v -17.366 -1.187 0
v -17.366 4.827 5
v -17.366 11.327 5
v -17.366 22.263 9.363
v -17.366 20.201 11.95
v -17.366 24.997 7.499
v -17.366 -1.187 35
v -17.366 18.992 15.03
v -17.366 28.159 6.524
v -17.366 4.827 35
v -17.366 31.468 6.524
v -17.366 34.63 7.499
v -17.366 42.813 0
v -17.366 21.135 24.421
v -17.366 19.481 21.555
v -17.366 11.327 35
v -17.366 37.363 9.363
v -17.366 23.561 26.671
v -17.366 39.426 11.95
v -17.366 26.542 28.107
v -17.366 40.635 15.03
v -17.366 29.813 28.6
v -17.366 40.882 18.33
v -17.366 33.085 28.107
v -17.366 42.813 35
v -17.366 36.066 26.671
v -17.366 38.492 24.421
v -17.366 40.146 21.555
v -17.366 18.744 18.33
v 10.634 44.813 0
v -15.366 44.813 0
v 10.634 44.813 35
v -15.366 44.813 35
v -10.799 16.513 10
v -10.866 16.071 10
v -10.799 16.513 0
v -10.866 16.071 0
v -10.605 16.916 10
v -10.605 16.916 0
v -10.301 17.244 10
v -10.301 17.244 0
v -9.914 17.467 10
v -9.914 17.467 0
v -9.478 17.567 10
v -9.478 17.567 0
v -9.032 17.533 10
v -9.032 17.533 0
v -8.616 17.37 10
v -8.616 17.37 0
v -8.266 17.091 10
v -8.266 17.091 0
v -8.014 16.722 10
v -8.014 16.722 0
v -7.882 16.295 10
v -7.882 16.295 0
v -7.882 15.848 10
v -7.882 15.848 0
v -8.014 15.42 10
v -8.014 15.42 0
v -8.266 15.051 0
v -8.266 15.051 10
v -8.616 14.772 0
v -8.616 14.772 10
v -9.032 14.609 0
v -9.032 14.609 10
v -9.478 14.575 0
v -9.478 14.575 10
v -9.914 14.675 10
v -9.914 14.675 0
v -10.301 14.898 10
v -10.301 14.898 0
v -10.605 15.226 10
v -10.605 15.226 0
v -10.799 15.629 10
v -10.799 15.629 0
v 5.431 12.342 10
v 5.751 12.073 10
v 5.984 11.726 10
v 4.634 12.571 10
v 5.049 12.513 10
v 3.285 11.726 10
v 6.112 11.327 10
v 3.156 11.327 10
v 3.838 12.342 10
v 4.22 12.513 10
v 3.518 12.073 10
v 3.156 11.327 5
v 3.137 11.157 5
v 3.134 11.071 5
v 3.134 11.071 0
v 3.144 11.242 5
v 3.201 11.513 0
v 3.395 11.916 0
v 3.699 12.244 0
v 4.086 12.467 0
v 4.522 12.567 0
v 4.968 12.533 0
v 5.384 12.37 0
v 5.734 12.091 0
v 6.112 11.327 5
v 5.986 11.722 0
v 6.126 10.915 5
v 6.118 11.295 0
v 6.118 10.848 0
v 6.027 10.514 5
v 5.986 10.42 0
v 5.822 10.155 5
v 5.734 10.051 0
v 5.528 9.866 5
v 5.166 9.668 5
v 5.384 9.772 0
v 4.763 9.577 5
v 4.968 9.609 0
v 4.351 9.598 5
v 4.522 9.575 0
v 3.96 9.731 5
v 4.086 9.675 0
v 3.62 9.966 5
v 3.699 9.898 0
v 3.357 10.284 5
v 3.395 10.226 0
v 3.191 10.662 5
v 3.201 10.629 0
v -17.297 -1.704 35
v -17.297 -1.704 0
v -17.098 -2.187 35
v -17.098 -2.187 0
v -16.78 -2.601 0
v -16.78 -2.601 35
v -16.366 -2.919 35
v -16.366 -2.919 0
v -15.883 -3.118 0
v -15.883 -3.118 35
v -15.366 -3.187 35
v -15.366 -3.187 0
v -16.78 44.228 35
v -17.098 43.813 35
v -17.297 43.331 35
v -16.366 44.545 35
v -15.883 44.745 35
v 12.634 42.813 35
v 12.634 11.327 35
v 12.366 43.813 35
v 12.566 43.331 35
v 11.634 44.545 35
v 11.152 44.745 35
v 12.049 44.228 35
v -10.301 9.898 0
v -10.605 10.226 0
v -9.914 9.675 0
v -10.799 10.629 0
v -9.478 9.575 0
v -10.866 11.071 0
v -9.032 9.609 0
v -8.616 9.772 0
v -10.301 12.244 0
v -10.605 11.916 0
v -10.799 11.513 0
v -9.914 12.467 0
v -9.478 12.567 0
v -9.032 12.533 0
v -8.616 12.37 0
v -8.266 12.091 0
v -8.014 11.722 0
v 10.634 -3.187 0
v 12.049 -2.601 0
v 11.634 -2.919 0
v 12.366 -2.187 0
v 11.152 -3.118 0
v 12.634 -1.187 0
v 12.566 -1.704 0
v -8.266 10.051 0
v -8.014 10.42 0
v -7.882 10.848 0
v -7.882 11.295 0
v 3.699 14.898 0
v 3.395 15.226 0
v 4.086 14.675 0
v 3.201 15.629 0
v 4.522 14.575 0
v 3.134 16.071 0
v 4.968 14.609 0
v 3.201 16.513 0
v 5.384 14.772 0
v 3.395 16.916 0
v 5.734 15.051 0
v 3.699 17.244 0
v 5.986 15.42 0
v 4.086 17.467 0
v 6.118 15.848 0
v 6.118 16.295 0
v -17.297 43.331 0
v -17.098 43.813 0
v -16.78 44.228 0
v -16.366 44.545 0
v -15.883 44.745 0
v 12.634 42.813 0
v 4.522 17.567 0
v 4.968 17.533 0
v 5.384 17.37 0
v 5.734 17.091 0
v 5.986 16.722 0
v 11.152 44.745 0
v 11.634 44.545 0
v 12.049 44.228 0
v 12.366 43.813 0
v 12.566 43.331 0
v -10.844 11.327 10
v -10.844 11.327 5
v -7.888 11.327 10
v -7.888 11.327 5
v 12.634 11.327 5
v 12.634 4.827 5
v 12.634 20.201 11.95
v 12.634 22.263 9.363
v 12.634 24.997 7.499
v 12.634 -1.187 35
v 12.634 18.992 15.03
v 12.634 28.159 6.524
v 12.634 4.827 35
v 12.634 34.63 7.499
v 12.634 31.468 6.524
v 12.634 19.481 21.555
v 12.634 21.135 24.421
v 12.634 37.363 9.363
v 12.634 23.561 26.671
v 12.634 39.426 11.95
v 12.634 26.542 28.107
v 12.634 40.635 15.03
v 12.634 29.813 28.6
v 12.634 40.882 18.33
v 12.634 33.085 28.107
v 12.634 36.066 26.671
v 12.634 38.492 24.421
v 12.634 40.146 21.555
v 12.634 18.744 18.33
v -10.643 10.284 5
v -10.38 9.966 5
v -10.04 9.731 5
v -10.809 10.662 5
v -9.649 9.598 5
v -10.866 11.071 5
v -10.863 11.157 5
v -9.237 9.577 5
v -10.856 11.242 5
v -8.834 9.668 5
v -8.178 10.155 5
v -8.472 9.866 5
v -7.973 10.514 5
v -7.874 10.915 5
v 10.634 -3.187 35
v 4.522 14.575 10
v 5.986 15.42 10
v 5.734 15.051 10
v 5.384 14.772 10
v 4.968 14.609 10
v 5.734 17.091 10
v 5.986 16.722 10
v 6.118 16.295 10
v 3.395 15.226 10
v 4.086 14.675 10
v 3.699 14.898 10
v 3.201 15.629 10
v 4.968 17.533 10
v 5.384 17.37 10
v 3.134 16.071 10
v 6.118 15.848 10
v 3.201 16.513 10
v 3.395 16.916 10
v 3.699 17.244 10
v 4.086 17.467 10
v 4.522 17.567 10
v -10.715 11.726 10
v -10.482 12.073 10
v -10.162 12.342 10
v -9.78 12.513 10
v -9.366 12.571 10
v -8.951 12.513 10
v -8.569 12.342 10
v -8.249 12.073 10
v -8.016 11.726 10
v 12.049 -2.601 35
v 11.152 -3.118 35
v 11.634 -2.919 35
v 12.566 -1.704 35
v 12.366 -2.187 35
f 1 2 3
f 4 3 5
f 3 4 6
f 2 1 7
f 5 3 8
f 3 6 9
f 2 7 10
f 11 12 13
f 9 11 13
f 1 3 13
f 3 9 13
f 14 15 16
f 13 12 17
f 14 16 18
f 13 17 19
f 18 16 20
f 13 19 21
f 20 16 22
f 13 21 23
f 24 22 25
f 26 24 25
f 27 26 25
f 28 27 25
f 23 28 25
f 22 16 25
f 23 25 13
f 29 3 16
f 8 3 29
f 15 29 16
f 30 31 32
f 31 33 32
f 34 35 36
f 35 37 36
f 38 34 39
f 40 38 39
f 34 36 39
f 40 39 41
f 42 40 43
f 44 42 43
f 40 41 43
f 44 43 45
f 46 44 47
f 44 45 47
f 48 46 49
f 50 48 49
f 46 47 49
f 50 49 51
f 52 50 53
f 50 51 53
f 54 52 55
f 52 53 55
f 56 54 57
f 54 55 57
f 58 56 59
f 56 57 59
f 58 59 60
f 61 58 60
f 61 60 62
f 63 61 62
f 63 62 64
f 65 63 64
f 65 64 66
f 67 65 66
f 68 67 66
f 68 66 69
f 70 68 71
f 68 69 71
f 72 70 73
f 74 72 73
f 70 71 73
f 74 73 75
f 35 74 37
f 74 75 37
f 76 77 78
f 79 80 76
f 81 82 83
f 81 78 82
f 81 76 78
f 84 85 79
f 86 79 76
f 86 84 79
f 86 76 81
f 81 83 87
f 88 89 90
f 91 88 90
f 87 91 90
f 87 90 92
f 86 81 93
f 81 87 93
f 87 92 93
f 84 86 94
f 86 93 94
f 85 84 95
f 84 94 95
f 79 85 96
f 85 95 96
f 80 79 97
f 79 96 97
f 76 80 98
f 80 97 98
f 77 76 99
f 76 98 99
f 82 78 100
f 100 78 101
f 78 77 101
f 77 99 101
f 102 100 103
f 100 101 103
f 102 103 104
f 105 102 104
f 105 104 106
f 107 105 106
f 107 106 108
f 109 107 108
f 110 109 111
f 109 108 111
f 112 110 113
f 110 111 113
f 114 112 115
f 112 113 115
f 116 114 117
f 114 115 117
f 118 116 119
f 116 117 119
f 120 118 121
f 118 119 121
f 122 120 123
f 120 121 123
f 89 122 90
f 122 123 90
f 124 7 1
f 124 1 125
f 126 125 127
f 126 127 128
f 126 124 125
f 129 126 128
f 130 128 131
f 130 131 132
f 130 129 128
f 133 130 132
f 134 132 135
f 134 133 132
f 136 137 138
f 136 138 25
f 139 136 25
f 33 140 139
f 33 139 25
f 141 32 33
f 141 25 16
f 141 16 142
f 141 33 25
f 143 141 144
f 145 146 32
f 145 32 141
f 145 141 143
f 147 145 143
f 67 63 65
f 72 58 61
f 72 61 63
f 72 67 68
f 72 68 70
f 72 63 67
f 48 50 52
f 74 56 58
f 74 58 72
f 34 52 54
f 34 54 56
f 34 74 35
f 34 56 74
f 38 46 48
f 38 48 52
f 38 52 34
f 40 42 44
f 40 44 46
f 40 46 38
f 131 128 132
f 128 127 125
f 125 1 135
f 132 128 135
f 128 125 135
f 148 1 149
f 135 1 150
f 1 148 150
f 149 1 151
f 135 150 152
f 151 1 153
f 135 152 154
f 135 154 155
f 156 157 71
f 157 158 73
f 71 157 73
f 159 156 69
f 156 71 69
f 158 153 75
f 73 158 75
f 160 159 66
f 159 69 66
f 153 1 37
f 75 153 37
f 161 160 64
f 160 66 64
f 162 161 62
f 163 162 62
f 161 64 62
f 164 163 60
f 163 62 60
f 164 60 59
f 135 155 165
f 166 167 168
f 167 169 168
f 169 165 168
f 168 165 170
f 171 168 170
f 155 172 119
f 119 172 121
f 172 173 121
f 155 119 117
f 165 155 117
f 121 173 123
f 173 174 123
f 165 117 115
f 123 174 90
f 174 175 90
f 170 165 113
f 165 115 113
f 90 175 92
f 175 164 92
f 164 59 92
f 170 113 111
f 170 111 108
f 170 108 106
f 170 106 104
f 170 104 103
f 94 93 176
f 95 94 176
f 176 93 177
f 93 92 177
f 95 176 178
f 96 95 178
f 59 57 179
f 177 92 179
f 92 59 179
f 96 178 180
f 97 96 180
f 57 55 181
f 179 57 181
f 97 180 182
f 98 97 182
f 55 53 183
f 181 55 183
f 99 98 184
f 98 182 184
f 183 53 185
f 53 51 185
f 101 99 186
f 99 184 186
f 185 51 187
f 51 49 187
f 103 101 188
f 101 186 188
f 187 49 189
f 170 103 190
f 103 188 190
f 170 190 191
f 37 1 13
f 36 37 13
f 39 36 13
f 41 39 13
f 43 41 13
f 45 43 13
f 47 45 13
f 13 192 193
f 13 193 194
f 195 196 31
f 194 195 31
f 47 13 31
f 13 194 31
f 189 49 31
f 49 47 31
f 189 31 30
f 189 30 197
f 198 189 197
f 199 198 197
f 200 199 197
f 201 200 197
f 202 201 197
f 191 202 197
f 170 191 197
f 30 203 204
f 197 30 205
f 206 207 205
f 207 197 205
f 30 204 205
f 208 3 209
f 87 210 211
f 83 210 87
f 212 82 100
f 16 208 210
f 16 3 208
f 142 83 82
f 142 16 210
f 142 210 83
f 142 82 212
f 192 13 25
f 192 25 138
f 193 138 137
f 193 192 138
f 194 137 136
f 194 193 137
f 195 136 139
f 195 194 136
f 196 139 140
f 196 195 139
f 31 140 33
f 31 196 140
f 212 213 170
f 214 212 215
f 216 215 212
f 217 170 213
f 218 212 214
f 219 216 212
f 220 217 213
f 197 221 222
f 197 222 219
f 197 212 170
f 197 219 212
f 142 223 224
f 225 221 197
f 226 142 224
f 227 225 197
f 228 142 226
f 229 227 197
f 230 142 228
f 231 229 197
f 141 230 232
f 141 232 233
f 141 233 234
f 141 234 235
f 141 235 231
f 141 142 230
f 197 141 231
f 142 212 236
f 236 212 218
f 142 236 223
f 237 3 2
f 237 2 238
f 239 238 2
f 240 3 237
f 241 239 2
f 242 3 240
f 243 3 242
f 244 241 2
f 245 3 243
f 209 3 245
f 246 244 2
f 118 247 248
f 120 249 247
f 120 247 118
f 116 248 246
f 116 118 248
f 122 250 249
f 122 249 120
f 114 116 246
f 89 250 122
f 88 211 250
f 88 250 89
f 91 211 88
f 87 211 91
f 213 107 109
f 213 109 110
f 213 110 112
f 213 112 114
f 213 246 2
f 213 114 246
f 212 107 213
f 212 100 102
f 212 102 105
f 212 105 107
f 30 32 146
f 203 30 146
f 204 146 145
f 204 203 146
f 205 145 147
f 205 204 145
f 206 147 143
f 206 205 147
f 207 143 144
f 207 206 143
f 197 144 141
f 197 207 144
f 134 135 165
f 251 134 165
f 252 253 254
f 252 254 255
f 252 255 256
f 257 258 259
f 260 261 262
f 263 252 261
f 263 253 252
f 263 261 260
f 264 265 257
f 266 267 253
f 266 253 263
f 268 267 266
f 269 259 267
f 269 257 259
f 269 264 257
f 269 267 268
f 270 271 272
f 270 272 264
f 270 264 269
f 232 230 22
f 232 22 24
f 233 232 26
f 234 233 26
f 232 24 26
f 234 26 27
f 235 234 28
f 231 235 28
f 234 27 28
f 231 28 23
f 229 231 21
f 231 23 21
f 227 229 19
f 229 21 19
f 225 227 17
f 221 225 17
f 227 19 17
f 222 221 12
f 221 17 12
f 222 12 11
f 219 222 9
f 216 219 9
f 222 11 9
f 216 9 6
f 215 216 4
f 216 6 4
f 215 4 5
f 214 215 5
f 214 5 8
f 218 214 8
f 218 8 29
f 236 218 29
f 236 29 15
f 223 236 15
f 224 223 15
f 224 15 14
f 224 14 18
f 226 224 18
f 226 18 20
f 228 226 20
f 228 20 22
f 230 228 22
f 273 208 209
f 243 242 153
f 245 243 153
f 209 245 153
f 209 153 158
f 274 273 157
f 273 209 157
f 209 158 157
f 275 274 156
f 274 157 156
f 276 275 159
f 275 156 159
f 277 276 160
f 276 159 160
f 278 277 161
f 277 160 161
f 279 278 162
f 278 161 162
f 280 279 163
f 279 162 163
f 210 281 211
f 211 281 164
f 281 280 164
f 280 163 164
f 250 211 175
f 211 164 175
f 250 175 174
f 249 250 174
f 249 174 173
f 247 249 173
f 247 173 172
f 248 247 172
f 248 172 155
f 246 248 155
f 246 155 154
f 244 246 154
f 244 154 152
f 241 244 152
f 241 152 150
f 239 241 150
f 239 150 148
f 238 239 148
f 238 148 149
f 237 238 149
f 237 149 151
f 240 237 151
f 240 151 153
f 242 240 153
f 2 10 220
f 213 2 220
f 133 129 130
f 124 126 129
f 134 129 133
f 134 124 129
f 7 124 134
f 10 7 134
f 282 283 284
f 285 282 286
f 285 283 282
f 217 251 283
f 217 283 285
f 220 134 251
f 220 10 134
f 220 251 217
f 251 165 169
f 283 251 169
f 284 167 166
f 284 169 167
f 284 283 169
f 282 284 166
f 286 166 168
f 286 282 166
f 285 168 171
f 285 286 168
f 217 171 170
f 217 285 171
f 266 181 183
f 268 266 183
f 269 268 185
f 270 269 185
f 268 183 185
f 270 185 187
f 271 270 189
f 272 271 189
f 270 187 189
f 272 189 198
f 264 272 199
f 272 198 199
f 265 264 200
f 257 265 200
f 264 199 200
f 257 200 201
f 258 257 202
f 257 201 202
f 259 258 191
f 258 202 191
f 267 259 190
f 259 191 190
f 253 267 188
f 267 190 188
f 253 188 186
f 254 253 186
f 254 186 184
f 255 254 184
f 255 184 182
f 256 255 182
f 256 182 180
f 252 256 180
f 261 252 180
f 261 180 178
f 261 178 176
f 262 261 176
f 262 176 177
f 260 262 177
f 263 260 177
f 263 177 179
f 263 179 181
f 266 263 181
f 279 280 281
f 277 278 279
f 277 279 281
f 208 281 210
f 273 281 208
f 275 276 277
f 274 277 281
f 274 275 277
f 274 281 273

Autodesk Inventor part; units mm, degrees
ref_plane "YZ Plane" through (0, 0, 0) normal (1, 0, 0) x (0, 1, 0)
ref_plane "XZ Plane" through (0, 0, 0) normal (0, 1, 0) x (-1, 0, 0)
sketch "Sketch1" plane through (0, 0, 0) normal (0, 0, 1) x (1, 0, 0)
  line L0 (-17.3656, -3.1866) -> (12.6344, -3.1866)
  line L1 (12.6344, -3.1866) -> (12.6344, 9.8134)
  line L2 (12.6344, 9.8134) -> (-17.3656, 9.8134)
  line L3 (-17.3656, 9.8134) -> (-17.3656, -3.1866)
  point P0 (0, 0)
  dimension "d0" = 30
  dimension "d1" = 13
extrude "Extrusion1" add sketch "Sketch1" along normal blind 35
sketch "Sketch2" plane through (0, 0, 35) normal (0, 0, 1) x (1, 0, 0)
  point P0 (0, 0)
sketch "Sketch3" plane through (0, 0, 35) normal (0, 0, 1) x (1, 0, 0)
  line L0 (-24.8388, 28.6624) -> (-24.5328, 28.6624)
  line L1 (12.6344, -3.1866) -> (12.6344, 9.8134) projected
  line L2 (-17.3656, 9.8134) -> (-17.3656, -3.1866) projected
  line L3 (-17.3656, 11.3273) -> (-17.3656, 4.8273)
  line L4 (15.1579, 11.3273) -> (15.1579, 4.8273)
  line L5 (-17.3656, 4.8273) -> (15.1579, 4.8273)
  line L6 (-17.3656, 11.3273) -> (15.1579, 11.3273)
  line L7 (-43.7964, 23.1681) -> (-44.8479, 23.9265)
  line L8 (-44.8479, 23.9265) -> (-43.7964, 23.1681)
  line L9 (-42.6813, 23.9265) -> (-43.7964, 23.1681)
  line L10 (-44.8479, 23.9265) -> (-45.923, 23.1739)
  line L11 (-41.5979, 23.1681) -> (-42.6813, 23.9265)
  line L12 (-40.5146, 23.9265) -> (-41.5979, 23.1681)
  line L13 (-38.3479, 23.9265) -> (-37.2646, 23.1681)
  line L14 (-37.2646, 23.1681) -> (-38.3479, 23.9265)
  line L15 (-40.5146, 23.9265) -> (-39.4313, 23.1681)
  line L16 (-38.3479, 23.9265) -> (-39.4313, 23.1681)
  line L17 (-39.4313, 23.1681) -> (-40.5146, 23.9265)
  line L18 (-30.7646, 23.1681) -> (-29.6813, 23.9265)
  line L19 (-29.6813, 23.9265) -> (-30.7646, 23.1681)
  line L20 (-31.8479, 23.9265) -> (-30.7646, 23.1681)
  line L21 (-32.9313, 23.1681) -> (-31.8479, 23.9265)
  line L22 (-36.1813, 23.9265) -> (-35.0979, 23.1681)
  line L23 (-34.0146, 23.9265) -> (-35.0979, 23.1681)
  line L24 (-35.0979, 23.1681) -> (-34.0146, 23.9265)
  line L25 (-34.0146, 23.9265) -> (-32.9313, 23.1681)
  line L26 (-36.1813, 23.9265) -> (-37.2646, 23.1681)
  line L27 (-29.6813, 23.9265) -> (-28.5979, 23.1681)
  line L28 (-14.5146, 23.9265) -> (-13.3995, 23.1739)
  line L29 (-15.5979, 23.1681) -> (-14.5146, 23.9265)
  line L30 (-16.6813, 23.9265) -> (-15.5979, 23.1681)
  line L31 (-16.6813, 23.9265) -> (-17.7646, 23.1681)
  line L32 (-17.7646, 23.1681) -> (-16.6813, 23.9265)
  line L33 (-18.8479, 23.9265) -> (-17.7646, 23.1681)
  line L34 (-18.8479, 23.9265) -> (-19.9313, 23.1681)
  line L35 (-19.9313, 23.1681) -> (-18.8479, 23.9265)
  line L36 (-21.0146, 23.9265) -> (-19.9313, 23.1681)
  line L37 (-21.0146, 23.9265) -> (-22.0979, 23.1681)
  line L38 (-23.1813, 23.9265) -> (-22.0979, 23.1681)
  line L39 (-22.0979, 23.1681) -> (-23.1813, 23.9265)
  line L40 (-23.1813, 23.9265) -> (-24.2646, 23.1681)
  line L41 (-24.2646, 23.1681) -> (-25.3479, 23.9265)
  line L42 (-26.4313, 23.1681) -> (-27.5146, 23.9265)
  line L43 (-27.5146, 23.9265) -> (-26.4313, 23.1681)
  line L44 (-25.3479, 23.9265) -> (-26.4313, 23.1681)
  line L45 (-27.5146, 23.9265) -> (-28.5979, 23.1681)
  line L46 (-45.923, 23.1739) -> (-45.923, 16.6739)
  line L47 (-13.3995, 23.1739) -> (-13.3995, 16.6739)
  line L48 (-45.923, 16.6739) -> (-13.3995, 16.6739)
  line L49 (-45.923, 23.1739) -> (-13.3995, 23.1739)
  point P0 (-17.3656, 7.8134)
  point P1 (10.6344, 9.8134)
  point P2 (-15.3656, 9.8134)
  point P3 (-17.3656, 2.7291)
  point P4 (15.1344, 5.7756)
  point P5 (-17.3656, 5.5444)
  point P6 (-17.3656, 2.7304)
  point P7 (12.6344, 4.8273)
  point P8 (-17.3656, 9.8134)
  point P9 (-45.923, 19.66)
  point P10 (-17.923, 21.66)
  point P11 (-43.923, 21.66)
  point P12 (-45.923, 21.66)
  point P13 (-15.923, 21.66)
  point P14 (-37.2646, 23.1828)
  point P15 (-19.9313, 23.1828)
  point P16 (-45.923, 17.391)
  dimension "d79" = 6.5
fillet "Fillet2" radius 2 2 edges at (-17.3656, -3.1866, 17.5) (12.6344, -3.1866, 17.5)
sketch "Sketch5" plane through (0, 0, 35) normal (0, 0, 1) x (1, 0, 0)
  line L0 (-17.3656, 0.1134) -> (-17.3656, 5.1134) projected
  line L1 (-17.3656, 21.8134) -> (-17.3656, 25.9634) construction
  line L2 (12.6344, 9.8134) -> (-17.3656, 9.8134) construction
  line L3 (-17.3656, 44.8134) -> (12.6344, 44.8134)
  line L4 (12.6344, 21.8134) -> (12.6344, 44.8134)
  line L5 (-17.3656, 9.8134) -> (12.6344, 9.8134) construction
  line L6 (-17.3656, 21.8134) -> (-17.3656, 44.8134)
  line L7 (12.6344, 9.8134) -> (-17.3656, 9.8134)
  line L8 (-17.3656, 21.8134) -> (-17.3656, 9.8134)
  line L9 (12.6344, 21.8134) -> (12.6344, 9.8134)
  line L10 (12.6344, 9.8134) -> (2.6344, 9.8134)
  point P0 (0, 0)
  point P1 (-17.3656, 2.6134)
  dimension "d15" = 23.35
  dimension "d17" = 35
  dimension "d20" = 30
  dimension "d21" = 10
extrude "Extrusion4" add sketch "Sketch5" against normal blind 35
ref_plane "Work Plane4" through (-17.3656, 0.1134, 28.8) normal (-1, 0, 0) x (0, 0, 1)
sketch "Sketch6" plane through (-17.3656, 0.1134, 28.8) normal (-1, 0, 0) x (0, 0, 1)
  line L0 (6.2, 44.7) -> (6.2, 5) projected
  line L1 (6.2, 29.7) -> (-11.3, 29.7) construction
  line L2 (6.2, 29.7) -> (23.7, 29.7) construction
  circle A0 centre (-11.3, 29.7) radius 11.1
  line L3 (6.2, 44.7) -> (-28.8, 44.7) projected
  point P0 (-28.8, -0.1134)
  point P1 (6.2, 27.7)
  dimension "d24" = 17.5
  dimension "d25" = 180
  dimension "d26" = 22.2
  dimension "d58" = 15
fillet "Fillet3" radius 2 2 edges at (-17.3656, 44.8134, 17.5) (12.6344, 44.8134, 17.5)
extrude "Extrusion7" cut sketch "Sketch6" against normal blind 35
sketch "Sketch8" plane through (0, 0, 0) normal (0, 0, -1) x (-1, 0, 0)
  circle A0 centre (-4.6344, 11.0711) radius 1.5 projected
  circle A1 centre (-4.6344, 11.0711) radius 1.5
  circle A2 centre (-4.6344, 16.0711) radius 1.5 projected
  circle A3 centre (-4.6344, 16.0711) radius 1.5
  circle A4 centre (9.3656, 16.0711) radius 1.5 projected
  circle A5 centre (9.3656, 16.0711) radius 1.5
  circle A6 centre (9.3656, 11.0711) radius 1.5 projected
  circle A7 centre (9.3656, 11.0711) radius 1.5
  point P0 (0, 0)
extrude "Extrusion8" cut sketch "Sketch8" against normal blind 10
sketch "Sketch9" plane through (0, 0, 35) normal (0, 0, 1) x (1, 0, 0)
  point P0 (0, 0)
extrude "Extrusion14" cut sketch "Sketch3" against normal blind 30 contours L3 L6 L4 L5 L2
thread "Thread1" size "M3x0.5" class "6H" standard "ANSI Metric M Profile" full length
thread "Thread2" size "M3x0.5" class "6H" standard "ANSI Metric M Profile" full length
thread "Thread3" size "M3x0.5" class "6H" standard "ANSI Metric M Profile" full length
thread "Thread4" size "M3x0.5" class "6H" standard "ANSI Metric M Profile" full length
properties part number "Beltclamp"
